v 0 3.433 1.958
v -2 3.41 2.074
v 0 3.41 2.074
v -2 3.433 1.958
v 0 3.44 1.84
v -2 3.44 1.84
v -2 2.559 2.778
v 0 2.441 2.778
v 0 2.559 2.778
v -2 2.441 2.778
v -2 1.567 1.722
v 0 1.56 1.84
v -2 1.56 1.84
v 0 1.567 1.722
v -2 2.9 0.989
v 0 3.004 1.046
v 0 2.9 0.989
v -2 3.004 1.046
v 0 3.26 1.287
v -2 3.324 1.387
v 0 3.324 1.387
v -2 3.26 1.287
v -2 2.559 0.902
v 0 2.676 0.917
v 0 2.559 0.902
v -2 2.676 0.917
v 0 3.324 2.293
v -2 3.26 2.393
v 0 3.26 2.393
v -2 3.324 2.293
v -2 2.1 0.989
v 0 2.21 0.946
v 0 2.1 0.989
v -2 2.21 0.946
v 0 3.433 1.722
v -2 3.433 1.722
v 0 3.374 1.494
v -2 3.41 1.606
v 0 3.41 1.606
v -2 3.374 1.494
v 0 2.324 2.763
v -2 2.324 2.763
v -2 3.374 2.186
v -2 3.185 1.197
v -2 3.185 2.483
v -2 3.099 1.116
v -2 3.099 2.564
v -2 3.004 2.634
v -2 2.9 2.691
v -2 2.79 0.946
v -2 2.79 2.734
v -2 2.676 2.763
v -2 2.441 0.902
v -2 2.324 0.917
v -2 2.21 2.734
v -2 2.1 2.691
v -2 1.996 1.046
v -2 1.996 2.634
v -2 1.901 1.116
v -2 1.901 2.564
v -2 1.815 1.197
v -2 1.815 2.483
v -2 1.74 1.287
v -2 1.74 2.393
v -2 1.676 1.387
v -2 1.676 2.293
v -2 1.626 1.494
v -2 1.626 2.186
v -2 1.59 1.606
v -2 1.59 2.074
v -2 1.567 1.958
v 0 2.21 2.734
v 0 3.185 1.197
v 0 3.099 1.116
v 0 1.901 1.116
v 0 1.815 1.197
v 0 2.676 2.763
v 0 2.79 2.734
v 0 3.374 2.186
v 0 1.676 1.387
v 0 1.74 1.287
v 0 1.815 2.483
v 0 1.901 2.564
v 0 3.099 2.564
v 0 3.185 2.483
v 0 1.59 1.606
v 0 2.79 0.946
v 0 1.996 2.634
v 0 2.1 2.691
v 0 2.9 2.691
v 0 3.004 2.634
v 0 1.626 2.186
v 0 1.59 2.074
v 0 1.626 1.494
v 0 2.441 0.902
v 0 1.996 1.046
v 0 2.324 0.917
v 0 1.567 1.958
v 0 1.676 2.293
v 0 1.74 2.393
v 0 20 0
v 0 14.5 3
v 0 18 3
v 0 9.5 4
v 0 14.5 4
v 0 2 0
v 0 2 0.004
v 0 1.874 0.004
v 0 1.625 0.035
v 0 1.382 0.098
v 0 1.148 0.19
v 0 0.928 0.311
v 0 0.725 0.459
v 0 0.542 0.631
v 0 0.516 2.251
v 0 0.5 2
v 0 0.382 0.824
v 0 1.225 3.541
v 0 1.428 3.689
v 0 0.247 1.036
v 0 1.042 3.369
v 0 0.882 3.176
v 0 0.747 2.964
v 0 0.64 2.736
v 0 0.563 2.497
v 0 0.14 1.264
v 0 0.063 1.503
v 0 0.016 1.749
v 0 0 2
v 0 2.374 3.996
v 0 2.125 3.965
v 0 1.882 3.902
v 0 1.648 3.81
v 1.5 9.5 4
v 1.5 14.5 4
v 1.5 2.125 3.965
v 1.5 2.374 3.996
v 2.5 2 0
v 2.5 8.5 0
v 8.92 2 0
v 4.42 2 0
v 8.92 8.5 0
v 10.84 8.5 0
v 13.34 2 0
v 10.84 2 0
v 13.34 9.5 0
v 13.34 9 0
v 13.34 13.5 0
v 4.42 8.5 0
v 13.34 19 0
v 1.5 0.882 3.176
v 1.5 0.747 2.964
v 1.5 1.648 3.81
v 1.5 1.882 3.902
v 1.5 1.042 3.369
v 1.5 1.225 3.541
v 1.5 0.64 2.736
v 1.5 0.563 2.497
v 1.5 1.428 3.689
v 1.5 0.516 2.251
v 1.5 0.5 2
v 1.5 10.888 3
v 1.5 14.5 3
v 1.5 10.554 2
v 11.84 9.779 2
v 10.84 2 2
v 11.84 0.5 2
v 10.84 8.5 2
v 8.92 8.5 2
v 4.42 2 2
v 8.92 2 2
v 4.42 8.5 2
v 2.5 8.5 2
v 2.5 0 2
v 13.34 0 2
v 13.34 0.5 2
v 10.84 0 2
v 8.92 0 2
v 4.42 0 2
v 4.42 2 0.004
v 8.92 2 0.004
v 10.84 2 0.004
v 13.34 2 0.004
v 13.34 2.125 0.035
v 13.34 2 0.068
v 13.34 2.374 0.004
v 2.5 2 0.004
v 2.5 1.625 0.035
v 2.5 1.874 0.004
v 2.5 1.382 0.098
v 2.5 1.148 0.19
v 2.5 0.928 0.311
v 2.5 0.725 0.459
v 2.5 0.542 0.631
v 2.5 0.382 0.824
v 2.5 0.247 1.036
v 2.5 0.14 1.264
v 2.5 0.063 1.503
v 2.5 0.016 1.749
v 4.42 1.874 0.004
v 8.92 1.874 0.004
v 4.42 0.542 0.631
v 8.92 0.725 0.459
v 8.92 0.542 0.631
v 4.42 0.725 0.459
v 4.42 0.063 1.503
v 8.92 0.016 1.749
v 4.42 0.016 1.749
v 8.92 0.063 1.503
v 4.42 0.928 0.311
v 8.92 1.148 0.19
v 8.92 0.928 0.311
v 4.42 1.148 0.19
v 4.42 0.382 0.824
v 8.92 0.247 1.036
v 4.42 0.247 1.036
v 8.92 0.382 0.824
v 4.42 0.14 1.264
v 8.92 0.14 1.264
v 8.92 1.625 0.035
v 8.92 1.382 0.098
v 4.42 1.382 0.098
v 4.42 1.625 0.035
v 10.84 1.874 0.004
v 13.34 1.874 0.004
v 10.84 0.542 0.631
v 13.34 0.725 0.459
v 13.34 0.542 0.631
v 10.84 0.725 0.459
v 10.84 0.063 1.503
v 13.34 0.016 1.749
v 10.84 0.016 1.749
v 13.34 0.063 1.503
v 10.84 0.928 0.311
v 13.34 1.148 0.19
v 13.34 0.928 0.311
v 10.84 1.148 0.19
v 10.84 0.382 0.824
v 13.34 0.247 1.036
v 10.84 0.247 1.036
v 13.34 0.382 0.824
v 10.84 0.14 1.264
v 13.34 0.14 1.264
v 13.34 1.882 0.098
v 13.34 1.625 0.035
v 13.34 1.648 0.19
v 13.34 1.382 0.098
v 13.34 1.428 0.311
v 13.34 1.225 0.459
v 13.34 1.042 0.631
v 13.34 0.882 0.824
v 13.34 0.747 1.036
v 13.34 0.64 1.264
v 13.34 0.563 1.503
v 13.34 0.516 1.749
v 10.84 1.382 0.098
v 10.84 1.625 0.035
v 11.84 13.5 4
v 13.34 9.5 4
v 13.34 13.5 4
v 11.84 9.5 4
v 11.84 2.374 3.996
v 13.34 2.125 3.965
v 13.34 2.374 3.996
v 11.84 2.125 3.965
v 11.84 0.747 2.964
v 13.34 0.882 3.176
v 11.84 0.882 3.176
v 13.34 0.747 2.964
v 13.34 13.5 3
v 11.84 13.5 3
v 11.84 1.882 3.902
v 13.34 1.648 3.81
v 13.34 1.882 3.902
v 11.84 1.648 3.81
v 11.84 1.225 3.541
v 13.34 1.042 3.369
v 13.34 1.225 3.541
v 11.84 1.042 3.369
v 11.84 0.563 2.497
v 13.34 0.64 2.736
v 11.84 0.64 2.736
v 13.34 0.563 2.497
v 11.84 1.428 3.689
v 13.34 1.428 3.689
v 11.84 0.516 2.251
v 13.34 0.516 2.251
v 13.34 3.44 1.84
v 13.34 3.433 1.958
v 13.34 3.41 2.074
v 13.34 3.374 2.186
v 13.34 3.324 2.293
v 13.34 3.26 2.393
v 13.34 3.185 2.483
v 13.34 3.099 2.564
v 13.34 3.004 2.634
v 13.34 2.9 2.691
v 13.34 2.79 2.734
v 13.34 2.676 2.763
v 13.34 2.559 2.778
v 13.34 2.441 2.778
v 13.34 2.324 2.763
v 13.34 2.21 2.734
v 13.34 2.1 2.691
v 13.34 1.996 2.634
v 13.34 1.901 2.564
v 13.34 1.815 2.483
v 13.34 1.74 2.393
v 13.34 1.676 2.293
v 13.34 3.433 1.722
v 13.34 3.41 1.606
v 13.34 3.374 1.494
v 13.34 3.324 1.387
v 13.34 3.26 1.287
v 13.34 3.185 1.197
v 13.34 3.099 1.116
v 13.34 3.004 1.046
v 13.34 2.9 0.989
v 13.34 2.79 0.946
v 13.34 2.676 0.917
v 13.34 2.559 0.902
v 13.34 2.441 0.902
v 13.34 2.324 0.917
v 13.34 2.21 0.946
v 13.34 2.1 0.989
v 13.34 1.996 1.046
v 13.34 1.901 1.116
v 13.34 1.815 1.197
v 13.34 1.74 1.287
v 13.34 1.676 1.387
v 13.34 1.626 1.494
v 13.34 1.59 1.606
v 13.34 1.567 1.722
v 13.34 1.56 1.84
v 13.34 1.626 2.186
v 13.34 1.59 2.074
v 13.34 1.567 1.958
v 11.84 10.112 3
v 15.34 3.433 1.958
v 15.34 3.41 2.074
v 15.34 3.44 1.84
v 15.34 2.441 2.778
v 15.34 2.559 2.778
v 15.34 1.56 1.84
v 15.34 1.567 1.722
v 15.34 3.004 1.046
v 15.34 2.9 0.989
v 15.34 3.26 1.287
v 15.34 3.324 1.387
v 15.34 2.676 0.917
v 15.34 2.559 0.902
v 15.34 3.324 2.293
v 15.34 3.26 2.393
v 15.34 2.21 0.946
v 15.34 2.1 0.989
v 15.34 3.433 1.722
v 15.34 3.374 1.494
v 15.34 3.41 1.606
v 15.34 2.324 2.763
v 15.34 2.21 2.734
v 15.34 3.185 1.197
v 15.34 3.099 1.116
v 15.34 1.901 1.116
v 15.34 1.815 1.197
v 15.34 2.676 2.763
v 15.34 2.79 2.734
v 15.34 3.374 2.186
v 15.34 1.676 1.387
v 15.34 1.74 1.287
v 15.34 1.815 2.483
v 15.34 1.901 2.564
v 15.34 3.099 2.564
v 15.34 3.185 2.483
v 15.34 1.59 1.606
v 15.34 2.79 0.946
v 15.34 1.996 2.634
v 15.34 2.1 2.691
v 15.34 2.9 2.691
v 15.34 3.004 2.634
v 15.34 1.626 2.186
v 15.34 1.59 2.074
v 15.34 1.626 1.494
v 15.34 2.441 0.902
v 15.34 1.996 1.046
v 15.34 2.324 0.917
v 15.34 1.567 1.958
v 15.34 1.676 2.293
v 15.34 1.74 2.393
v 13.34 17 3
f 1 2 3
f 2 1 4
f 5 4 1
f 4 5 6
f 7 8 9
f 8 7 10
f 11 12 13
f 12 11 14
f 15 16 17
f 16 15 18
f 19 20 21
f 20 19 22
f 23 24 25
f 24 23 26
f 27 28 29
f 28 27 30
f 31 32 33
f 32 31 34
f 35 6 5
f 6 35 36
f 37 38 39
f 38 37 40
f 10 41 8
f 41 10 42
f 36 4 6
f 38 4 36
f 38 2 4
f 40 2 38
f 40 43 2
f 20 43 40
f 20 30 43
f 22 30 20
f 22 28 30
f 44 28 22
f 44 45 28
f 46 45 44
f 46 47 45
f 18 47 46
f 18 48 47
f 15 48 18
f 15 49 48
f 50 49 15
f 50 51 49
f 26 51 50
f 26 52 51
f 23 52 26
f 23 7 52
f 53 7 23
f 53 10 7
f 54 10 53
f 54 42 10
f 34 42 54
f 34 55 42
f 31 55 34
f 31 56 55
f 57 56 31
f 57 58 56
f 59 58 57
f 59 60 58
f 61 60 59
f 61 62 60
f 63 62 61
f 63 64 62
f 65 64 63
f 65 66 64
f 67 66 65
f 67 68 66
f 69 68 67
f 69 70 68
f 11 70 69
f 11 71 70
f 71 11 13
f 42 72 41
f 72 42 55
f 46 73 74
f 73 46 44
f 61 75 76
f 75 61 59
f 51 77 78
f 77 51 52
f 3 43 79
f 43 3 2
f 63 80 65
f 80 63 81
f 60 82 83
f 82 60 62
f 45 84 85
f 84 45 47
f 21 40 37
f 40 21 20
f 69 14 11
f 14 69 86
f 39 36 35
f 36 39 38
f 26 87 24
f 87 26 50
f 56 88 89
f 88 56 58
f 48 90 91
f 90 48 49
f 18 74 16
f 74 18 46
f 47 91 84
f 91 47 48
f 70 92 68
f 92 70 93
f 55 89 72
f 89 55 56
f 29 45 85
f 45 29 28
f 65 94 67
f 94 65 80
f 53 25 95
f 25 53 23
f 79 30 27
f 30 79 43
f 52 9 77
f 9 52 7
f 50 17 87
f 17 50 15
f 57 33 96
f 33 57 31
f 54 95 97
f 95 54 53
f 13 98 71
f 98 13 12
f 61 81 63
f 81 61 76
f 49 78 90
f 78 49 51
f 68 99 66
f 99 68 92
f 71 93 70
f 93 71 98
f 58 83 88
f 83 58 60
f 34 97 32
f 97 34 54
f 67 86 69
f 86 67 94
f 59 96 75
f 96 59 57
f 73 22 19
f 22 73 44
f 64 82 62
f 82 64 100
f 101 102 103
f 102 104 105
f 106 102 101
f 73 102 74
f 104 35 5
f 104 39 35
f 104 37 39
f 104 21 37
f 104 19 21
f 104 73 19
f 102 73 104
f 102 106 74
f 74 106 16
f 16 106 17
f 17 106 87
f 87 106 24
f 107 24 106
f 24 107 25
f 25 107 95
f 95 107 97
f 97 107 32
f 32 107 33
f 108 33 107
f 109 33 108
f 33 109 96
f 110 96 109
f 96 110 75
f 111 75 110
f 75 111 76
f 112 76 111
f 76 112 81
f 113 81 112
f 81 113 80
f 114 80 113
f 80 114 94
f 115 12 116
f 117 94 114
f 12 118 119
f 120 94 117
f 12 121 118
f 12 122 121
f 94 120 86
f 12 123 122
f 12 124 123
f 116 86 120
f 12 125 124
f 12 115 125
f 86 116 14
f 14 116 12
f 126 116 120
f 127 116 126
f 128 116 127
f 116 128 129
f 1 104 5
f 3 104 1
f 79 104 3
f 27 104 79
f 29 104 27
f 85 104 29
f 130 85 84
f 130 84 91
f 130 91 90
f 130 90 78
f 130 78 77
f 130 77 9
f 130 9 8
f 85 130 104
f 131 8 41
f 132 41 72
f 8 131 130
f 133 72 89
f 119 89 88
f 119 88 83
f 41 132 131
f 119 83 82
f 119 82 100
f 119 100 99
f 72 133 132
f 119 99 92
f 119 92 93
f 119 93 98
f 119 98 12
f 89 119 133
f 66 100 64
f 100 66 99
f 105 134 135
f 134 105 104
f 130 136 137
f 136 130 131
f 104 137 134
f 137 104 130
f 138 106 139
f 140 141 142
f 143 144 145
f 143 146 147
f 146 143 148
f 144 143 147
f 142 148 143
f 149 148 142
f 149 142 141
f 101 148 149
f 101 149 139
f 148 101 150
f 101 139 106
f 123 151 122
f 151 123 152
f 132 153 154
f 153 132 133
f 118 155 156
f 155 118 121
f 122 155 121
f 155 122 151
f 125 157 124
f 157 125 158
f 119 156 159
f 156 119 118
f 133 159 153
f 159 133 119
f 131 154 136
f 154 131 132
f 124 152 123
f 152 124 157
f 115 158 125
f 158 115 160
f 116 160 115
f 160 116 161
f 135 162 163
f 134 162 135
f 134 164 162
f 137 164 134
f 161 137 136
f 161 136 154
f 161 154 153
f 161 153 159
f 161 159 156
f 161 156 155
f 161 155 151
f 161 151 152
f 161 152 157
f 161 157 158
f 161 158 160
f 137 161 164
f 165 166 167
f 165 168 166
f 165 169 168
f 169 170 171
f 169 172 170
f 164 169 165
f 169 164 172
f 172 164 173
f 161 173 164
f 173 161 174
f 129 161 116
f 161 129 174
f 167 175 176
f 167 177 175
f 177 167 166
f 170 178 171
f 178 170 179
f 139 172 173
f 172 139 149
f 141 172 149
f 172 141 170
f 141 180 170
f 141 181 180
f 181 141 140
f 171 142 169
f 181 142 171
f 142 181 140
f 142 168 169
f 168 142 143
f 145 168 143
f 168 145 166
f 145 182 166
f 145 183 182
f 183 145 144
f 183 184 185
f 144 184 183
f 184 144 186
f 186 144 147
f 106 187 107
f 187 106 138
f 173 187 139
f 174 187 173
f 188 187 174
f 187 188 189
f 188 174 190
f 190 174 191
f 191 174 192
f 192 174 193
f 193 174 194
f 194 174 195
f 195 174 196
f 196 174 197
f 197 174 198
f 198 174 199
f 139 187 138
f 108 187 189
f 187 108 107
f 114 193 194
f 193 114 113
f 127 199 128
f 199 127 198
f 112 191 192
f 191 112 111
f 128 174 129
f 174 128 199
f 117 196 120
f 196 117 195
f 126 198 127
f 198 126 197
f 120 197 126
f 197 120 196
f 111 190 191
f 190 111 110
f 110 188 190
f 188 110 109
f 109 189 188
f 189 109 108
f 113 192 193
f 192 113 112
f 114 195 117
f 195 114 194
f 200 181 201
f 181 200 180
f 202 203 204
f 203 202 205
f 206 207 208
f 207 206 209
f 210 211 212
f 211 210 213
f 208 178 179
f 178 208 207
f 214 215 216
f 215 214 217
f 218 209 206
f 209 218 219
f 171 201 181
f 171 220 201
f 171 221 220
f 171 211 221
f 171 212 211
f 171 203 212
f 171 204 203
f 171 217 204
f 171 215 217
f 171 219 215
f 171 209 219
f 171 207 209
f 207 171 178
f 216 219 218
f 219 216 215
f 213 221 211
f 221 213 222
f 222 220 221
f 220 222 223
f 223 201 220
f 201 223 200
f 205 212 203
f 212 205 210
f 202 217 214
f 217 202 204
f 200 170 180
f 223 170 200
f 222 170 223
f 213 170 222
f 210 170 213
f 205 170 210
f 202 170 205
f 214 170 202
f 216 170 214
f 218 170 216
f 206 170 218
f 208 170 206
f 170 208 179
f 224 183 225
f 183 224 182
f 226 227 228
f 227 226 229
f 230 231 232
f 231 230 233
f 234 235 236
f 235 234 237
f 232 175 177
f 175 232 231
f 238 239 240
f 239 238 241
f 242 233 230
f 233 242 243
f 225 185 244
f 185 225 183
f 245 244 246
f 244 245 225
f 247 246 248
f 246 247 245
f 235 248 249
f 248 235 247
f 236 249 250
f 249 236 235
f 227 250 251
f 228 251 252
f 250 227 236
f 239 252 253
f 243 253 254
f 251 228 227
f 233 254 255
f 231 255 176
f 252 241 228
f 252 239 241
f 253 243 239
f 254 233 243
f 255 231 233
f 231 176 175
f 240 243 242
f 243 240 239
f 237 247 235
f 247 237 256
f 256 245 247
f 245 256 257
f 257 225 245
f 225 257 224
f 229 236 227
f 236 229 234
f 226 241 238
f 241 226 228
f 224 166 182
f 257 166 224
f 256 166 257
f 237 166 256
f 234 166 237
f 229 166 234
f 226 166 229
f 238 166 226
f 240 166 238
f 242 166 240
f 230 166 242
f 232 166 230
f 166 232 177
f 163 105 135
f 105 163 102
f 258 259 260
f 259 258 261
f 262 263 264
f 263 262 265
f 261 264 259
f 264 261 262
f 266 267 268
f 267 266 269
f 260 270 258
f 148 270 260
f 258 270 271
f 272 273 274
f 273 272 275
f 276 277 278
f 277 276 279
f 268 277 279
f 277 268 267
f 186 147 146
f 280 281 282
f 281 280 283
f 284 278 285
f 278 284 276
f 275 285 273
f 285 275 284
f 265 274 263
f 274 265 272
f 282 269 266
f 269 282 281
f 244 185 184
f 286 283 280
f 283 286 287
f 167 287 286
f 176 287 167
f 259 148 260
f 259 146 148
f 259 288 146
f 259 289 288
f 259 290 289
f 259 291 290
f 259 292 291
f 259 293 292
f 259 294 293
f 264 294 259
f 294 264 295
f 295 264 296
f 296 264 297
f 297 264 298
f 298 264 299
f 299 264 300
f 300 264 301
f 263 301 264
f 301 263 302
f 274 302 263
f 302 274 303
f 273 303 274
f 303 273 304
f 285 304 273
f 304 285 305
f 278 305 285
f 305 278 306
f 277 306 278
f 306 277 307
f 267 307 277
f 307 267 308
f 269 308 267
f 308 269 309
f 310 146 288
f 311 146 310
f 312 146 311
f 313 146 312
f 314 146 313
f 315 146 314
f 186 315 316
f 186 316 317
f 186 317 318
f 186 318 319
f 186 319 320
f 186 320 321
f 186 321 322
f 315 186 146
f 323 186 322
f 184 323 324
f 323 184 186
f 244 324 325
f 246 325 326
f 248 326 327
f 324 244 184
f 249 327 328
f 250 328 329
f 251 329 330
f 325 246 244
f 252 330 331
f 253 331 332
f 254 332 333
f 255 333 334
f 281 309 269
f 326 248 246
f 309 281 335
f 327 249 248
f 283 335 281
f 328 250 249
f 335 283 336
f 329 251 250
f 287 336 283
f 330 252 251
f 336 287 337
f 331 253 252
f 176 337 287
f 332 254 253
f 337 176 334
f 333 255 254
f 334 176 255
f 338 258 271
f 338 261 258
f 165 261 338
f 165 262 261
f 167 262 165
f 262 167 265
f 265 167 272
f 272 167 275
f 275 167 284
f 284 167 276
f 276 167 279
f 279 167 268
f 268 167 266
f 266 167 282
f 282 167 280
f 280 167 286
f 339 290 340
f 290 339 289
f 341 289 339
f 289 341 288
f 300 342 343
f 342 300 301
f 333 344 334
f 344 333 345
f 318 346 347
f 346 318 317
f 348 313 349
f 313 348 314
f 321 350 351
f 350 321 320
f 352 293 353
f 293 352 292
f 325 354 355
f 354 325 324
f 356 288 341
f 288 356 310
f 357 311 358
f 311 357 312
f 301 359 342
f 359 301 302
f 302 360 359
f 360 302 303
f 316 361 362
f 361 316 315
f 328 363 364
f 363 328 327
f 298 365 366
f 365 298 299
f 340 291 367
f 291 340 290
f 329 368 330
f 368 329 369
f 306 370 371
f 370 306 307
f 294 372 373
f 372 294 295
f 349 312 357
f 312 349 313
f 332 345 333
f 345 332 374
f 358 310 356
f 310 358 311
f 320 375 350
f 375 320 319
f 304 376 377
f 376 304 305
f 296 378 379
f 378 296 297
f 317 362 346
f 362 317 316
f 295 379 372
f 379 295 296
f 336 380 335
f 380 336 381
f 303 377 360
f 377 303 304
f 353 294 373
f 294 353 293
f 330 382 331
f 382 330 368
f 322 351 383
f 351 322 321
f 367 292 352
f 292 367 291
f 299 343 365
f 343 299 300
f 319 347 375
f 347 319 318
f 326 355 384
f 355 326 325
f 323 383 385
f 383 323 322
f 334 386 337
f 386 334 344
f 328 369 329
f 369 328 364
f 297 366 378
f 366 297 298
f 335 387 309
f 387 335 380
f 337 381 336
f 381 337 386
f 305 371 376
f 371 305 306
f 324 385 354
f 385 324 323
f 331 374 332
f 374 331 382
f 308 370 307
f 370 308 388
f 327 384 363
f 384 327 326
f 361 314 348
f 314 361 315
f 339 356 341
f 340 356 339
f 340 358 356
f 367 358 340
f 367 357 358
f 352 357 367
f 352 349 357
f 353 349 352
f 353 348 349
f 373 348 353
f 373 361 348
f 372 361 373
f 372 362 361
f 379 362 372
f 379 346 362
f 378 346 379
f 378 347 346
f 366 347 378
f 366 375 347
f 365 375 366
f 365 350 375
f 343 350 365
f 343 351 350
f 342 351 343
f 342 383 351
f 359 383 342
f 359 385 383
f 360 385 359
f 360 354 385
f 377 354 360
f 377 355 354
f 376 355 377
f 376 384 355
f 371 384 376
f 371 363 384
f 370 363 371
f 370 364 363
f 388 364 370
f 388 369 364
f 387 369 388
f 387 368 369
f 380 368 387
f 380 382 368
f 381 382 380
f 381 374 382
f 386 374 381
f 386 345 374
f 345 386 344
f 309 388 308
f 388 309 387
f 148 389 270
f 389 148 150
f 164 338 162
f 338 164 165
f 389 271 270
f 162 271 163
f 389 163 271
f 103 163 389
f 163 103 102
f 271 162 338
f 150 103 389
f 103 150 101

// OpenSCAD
// file: ../../../common/circle_sector.scad
module circle_sector(r = 0, d = 0, a = [0, 180]) {
    r = max(r, d / 2);
    sector_r = r / cos(180 / $fn);
    step = -360 / $fn;

    points = concat([[0, 0]],
        [for(a = [a[0] : step : a[1] - 360])
            [sector_r * cos(a), sector_r * sin(a)]
        ],
        [[sector_r * cos(a[1]), sector_r * sin(a[1])]]
    );

    difference() {
        circle(r);
        polygon(points);
    }
}

circle_sector();
// file: lenovo_trackpoint_II_keyboard_foldable_foot.scad
use <../../../common/circle_sector.scad>;
function body_width() = 13.34; // mm, without the shafts on the shaft arm

function body_bottom_length_1() = 19.0; // the end tip is a slightly angled wedge shape
function body_bottom_length_2() = 20.0;
function body_top_length_1() = 16.5;
function body_top_length_2() = 17.5;
function body_paralelogram_factor() = 1.0; // mm, the body has paralelogram shape, the top is offset by this amount

function tip_height() = 3.0;
function tip_bottom_length_1() = 10.0;
function tip_bottom_length_2() = 11.0;
function tip_wedge_factor() = 2.0;
function body_wedge_factor() = 1.0;

function tip_top_length_1() = tip_bottom_length_1() - tip_wedge_factor();
function tip_top_length_2() = tip_bottom_length_2() - tip_wedge_factor();

function body_offset_y() = 9.0;

module main_body_with_tip() {
    // counter-clockwise order, bottom 4 points, then top 4 points
    CubePoints = [
            // bottom
            [0, body_paralelogram_factor(), 0], // 0, bottom - left-down corner
            [body_width(), 0, 0], //1 bottom - right-down corner
            [body_width(), tip_bottom_length_1(), 0], //2 bottom - right-up corner
            [0, tip_bottom_length_2(), 0], //3 bottom - left-up corner

            // top
            [0, body_paralelogram_factor() + body_wedge_factor(), tip_height()], //4 top - left-down corner
            [body_width(), body_wedge_factor(), tip_height()], //5 top - right-down corner
            [body_width(), tip_top_length_1(), tip_height()], //6 top - right-up corner
            [0, tip_top_length_2(), tip_height()] //7 top - left-up corner
        ];

    CubeFaces = [
            [0, 1, 2, 3], // bottom
            [4, 5, 1, 0], // front
            [7, 6, 5, 4], // top
            [5, 6, 2, 1], // right
            [6, 7, 3, 2], // back
            [7, 4, 0, 3] // left
        ];

    polyhedron(CubePoints, CubeFaces);
}

function spring_arm_height() = 2.0; // this is the thinnest part

function spring_arm_center_width() = 4.5;
function spring_arm_side_width() = 2.5;

function spring_arm_cutaway_depth() = 8.5;
function spring_arm_cutaway_width() = 1.92;
function spring_arm_depth_top_1() = 10.0;
function spring_arm_length_short() = 10.0;
function spring_arm_length_long() = 11.0;
function spring_arm_end_curve_r() = spring_arm_height();

module spring_arm() {
    total_width = spring_arm_side_width() * 2 + spring_arm_cutaway_width() * 2 + spring_arm_center_width();
    echo("total_width = ", total_width);
    l_short = spring_arm_length_short() - spring_arm_end_curve_r();
    l_long = spring_arm_length_long() - spring_arm_end_curve_r();
    cutaway_l = spring_arm_cutaway_depth() - spring_arm_end_curve_r();

    center_spring_offset_x = spring_arm_side_width() + spring_arm_cutaway_width();
    side_spring_offset_x = total_width - spring_arm_side_width();

    union() {
        translate([0, spring_arm_height(), 0]) linear_extrude(spring_arm_height())
            polygon(
            points = [
                    [0, 0],
                    [0, l_long],
                    [total_width, l_long],
                    [total_width, 0],
                    [total_width - spring_arm_side_width(), 0],
                    [total_width - spring_arm_side_width(), cutaway_l],
                    [total_width / 2 + spring_arm_center_width() / 2, cutaway_l],
                    [total_width / 2 + spring_arm_center_width() / 2, 0],
                    [total_width / 2 - spring_arm_center_width() / 2, 0],
                    [total_width / 2 - spring_arm_center_width() / 2, cutaway_l],
                    [spring_arm_side_width(), cutaway_l],
                    [spring_arm_side_width(), 0],
                ]
            );

        translate([0, spring_arm_end_curve_r(), spring_arm_end_curve_r()]) rotate([-90, 0, -90]) linear_extrude(
        spring_arm_side_width()) circle_sector(r = spring_arm_end_curve_r(), a = [0, 90]);
        translate([center_spring_offset_x, spring_arm_end_curve_r(), spring_arm_end_curve_r()]) rotate([-90, 0, -90])
            linear_extrude(spring_arm_center_width()) circle_sector(r = spring_arm_end_curve_r(), a = [0, 90]);
        translate([side_spring_offset_x, spring_arm_end_curve_r(), spring_arm_end_curve_r()]) rotate([-90, 0, -90])
            linear_extrude(spring_arm_side_width()) circle_sector(r = spring_arm_end_curve_r(), a = [0, 90]);
    }
}

function shaft_diameter() = 1.88;
function shaft_length() = 2.0;
function shaft_offset_from_bottom() = 0.9;
function shaft_arm_height() = 4.0; // this is the thickest part
function shaft_arm_width() = 1.5;
function shaft_arm_length_short() = 9.0;
function shaft_arm_length_long() = 10.0;
function shaft_arm_end_top_curve_r() = 2.0;
//function shaft_arm_end_bottom_curve_r() = 1.0;
function shaft_arm_end_offset_from_spring_arm_end() = 0.5;
function shaft_arm_chop_off_height() = 1; // mm

module shaft_arm(l = shaft_arm_length_short(), shaft_side = "left") {
    translate([0, shaft_arm_end_top_curve_r() + shaft_arm_end_offset_from_spring_arm_end(), 0])
    rotate([90, 0, 90])
    union() {
        linear_extrude(shaft_arm_width()) {
            hull() {
                translate([0, shaft_arm_end_top_curve_r()]) circle(r = shaft_arm_end_top_curve_r());
                translate([l - shaft_arm_height() / 2, 0]) square(shaft_arm_height());
            }
        }
        if (shaft_side == "left") {
            difference() {
                translate([0, shaft_diameter() / 2 + shaft_offset_from_bottom(), - shaft_length()]) cylinder(d=shaft_diameter(), h=shaft_length());
                cube(shaft_diameter() * 2);
            }
        } else {
            translate([0, shaft_diameter() / 2 + shaft_offset_from_bottom(), shaft_arm_width()]) cylinder(d=shaft_diameter(), h=shaft_length());
        }
    }
}

module foot_left_without_text() {
    union() {
        shaft_arm();
        spring_arm();
        shaft_arm(l = shaft_arm_length_long(), shaft_side = "left");
        translate([body_width() - shaft_arm_width(), 0 ,0]) shaft_arm(l = shaft_arm_length_short(), shaft_side = "right");
        translate([0, body_offset_y(), 0]) main_body_with_tip();
    }
}

module foot_right_without_text() {
    mirror([1, 0, 0]) foot_left_without_text();
}

$fn = 50;
color("red") foot_left_without_text();
color("green") translate([50, 0, 0]) foot_right_without_text();
// main file
use <lenovo_trackpoint_II_keyboard_foldable_foot.scad>

$fn=50;
color("red") foot_left_without_text();
